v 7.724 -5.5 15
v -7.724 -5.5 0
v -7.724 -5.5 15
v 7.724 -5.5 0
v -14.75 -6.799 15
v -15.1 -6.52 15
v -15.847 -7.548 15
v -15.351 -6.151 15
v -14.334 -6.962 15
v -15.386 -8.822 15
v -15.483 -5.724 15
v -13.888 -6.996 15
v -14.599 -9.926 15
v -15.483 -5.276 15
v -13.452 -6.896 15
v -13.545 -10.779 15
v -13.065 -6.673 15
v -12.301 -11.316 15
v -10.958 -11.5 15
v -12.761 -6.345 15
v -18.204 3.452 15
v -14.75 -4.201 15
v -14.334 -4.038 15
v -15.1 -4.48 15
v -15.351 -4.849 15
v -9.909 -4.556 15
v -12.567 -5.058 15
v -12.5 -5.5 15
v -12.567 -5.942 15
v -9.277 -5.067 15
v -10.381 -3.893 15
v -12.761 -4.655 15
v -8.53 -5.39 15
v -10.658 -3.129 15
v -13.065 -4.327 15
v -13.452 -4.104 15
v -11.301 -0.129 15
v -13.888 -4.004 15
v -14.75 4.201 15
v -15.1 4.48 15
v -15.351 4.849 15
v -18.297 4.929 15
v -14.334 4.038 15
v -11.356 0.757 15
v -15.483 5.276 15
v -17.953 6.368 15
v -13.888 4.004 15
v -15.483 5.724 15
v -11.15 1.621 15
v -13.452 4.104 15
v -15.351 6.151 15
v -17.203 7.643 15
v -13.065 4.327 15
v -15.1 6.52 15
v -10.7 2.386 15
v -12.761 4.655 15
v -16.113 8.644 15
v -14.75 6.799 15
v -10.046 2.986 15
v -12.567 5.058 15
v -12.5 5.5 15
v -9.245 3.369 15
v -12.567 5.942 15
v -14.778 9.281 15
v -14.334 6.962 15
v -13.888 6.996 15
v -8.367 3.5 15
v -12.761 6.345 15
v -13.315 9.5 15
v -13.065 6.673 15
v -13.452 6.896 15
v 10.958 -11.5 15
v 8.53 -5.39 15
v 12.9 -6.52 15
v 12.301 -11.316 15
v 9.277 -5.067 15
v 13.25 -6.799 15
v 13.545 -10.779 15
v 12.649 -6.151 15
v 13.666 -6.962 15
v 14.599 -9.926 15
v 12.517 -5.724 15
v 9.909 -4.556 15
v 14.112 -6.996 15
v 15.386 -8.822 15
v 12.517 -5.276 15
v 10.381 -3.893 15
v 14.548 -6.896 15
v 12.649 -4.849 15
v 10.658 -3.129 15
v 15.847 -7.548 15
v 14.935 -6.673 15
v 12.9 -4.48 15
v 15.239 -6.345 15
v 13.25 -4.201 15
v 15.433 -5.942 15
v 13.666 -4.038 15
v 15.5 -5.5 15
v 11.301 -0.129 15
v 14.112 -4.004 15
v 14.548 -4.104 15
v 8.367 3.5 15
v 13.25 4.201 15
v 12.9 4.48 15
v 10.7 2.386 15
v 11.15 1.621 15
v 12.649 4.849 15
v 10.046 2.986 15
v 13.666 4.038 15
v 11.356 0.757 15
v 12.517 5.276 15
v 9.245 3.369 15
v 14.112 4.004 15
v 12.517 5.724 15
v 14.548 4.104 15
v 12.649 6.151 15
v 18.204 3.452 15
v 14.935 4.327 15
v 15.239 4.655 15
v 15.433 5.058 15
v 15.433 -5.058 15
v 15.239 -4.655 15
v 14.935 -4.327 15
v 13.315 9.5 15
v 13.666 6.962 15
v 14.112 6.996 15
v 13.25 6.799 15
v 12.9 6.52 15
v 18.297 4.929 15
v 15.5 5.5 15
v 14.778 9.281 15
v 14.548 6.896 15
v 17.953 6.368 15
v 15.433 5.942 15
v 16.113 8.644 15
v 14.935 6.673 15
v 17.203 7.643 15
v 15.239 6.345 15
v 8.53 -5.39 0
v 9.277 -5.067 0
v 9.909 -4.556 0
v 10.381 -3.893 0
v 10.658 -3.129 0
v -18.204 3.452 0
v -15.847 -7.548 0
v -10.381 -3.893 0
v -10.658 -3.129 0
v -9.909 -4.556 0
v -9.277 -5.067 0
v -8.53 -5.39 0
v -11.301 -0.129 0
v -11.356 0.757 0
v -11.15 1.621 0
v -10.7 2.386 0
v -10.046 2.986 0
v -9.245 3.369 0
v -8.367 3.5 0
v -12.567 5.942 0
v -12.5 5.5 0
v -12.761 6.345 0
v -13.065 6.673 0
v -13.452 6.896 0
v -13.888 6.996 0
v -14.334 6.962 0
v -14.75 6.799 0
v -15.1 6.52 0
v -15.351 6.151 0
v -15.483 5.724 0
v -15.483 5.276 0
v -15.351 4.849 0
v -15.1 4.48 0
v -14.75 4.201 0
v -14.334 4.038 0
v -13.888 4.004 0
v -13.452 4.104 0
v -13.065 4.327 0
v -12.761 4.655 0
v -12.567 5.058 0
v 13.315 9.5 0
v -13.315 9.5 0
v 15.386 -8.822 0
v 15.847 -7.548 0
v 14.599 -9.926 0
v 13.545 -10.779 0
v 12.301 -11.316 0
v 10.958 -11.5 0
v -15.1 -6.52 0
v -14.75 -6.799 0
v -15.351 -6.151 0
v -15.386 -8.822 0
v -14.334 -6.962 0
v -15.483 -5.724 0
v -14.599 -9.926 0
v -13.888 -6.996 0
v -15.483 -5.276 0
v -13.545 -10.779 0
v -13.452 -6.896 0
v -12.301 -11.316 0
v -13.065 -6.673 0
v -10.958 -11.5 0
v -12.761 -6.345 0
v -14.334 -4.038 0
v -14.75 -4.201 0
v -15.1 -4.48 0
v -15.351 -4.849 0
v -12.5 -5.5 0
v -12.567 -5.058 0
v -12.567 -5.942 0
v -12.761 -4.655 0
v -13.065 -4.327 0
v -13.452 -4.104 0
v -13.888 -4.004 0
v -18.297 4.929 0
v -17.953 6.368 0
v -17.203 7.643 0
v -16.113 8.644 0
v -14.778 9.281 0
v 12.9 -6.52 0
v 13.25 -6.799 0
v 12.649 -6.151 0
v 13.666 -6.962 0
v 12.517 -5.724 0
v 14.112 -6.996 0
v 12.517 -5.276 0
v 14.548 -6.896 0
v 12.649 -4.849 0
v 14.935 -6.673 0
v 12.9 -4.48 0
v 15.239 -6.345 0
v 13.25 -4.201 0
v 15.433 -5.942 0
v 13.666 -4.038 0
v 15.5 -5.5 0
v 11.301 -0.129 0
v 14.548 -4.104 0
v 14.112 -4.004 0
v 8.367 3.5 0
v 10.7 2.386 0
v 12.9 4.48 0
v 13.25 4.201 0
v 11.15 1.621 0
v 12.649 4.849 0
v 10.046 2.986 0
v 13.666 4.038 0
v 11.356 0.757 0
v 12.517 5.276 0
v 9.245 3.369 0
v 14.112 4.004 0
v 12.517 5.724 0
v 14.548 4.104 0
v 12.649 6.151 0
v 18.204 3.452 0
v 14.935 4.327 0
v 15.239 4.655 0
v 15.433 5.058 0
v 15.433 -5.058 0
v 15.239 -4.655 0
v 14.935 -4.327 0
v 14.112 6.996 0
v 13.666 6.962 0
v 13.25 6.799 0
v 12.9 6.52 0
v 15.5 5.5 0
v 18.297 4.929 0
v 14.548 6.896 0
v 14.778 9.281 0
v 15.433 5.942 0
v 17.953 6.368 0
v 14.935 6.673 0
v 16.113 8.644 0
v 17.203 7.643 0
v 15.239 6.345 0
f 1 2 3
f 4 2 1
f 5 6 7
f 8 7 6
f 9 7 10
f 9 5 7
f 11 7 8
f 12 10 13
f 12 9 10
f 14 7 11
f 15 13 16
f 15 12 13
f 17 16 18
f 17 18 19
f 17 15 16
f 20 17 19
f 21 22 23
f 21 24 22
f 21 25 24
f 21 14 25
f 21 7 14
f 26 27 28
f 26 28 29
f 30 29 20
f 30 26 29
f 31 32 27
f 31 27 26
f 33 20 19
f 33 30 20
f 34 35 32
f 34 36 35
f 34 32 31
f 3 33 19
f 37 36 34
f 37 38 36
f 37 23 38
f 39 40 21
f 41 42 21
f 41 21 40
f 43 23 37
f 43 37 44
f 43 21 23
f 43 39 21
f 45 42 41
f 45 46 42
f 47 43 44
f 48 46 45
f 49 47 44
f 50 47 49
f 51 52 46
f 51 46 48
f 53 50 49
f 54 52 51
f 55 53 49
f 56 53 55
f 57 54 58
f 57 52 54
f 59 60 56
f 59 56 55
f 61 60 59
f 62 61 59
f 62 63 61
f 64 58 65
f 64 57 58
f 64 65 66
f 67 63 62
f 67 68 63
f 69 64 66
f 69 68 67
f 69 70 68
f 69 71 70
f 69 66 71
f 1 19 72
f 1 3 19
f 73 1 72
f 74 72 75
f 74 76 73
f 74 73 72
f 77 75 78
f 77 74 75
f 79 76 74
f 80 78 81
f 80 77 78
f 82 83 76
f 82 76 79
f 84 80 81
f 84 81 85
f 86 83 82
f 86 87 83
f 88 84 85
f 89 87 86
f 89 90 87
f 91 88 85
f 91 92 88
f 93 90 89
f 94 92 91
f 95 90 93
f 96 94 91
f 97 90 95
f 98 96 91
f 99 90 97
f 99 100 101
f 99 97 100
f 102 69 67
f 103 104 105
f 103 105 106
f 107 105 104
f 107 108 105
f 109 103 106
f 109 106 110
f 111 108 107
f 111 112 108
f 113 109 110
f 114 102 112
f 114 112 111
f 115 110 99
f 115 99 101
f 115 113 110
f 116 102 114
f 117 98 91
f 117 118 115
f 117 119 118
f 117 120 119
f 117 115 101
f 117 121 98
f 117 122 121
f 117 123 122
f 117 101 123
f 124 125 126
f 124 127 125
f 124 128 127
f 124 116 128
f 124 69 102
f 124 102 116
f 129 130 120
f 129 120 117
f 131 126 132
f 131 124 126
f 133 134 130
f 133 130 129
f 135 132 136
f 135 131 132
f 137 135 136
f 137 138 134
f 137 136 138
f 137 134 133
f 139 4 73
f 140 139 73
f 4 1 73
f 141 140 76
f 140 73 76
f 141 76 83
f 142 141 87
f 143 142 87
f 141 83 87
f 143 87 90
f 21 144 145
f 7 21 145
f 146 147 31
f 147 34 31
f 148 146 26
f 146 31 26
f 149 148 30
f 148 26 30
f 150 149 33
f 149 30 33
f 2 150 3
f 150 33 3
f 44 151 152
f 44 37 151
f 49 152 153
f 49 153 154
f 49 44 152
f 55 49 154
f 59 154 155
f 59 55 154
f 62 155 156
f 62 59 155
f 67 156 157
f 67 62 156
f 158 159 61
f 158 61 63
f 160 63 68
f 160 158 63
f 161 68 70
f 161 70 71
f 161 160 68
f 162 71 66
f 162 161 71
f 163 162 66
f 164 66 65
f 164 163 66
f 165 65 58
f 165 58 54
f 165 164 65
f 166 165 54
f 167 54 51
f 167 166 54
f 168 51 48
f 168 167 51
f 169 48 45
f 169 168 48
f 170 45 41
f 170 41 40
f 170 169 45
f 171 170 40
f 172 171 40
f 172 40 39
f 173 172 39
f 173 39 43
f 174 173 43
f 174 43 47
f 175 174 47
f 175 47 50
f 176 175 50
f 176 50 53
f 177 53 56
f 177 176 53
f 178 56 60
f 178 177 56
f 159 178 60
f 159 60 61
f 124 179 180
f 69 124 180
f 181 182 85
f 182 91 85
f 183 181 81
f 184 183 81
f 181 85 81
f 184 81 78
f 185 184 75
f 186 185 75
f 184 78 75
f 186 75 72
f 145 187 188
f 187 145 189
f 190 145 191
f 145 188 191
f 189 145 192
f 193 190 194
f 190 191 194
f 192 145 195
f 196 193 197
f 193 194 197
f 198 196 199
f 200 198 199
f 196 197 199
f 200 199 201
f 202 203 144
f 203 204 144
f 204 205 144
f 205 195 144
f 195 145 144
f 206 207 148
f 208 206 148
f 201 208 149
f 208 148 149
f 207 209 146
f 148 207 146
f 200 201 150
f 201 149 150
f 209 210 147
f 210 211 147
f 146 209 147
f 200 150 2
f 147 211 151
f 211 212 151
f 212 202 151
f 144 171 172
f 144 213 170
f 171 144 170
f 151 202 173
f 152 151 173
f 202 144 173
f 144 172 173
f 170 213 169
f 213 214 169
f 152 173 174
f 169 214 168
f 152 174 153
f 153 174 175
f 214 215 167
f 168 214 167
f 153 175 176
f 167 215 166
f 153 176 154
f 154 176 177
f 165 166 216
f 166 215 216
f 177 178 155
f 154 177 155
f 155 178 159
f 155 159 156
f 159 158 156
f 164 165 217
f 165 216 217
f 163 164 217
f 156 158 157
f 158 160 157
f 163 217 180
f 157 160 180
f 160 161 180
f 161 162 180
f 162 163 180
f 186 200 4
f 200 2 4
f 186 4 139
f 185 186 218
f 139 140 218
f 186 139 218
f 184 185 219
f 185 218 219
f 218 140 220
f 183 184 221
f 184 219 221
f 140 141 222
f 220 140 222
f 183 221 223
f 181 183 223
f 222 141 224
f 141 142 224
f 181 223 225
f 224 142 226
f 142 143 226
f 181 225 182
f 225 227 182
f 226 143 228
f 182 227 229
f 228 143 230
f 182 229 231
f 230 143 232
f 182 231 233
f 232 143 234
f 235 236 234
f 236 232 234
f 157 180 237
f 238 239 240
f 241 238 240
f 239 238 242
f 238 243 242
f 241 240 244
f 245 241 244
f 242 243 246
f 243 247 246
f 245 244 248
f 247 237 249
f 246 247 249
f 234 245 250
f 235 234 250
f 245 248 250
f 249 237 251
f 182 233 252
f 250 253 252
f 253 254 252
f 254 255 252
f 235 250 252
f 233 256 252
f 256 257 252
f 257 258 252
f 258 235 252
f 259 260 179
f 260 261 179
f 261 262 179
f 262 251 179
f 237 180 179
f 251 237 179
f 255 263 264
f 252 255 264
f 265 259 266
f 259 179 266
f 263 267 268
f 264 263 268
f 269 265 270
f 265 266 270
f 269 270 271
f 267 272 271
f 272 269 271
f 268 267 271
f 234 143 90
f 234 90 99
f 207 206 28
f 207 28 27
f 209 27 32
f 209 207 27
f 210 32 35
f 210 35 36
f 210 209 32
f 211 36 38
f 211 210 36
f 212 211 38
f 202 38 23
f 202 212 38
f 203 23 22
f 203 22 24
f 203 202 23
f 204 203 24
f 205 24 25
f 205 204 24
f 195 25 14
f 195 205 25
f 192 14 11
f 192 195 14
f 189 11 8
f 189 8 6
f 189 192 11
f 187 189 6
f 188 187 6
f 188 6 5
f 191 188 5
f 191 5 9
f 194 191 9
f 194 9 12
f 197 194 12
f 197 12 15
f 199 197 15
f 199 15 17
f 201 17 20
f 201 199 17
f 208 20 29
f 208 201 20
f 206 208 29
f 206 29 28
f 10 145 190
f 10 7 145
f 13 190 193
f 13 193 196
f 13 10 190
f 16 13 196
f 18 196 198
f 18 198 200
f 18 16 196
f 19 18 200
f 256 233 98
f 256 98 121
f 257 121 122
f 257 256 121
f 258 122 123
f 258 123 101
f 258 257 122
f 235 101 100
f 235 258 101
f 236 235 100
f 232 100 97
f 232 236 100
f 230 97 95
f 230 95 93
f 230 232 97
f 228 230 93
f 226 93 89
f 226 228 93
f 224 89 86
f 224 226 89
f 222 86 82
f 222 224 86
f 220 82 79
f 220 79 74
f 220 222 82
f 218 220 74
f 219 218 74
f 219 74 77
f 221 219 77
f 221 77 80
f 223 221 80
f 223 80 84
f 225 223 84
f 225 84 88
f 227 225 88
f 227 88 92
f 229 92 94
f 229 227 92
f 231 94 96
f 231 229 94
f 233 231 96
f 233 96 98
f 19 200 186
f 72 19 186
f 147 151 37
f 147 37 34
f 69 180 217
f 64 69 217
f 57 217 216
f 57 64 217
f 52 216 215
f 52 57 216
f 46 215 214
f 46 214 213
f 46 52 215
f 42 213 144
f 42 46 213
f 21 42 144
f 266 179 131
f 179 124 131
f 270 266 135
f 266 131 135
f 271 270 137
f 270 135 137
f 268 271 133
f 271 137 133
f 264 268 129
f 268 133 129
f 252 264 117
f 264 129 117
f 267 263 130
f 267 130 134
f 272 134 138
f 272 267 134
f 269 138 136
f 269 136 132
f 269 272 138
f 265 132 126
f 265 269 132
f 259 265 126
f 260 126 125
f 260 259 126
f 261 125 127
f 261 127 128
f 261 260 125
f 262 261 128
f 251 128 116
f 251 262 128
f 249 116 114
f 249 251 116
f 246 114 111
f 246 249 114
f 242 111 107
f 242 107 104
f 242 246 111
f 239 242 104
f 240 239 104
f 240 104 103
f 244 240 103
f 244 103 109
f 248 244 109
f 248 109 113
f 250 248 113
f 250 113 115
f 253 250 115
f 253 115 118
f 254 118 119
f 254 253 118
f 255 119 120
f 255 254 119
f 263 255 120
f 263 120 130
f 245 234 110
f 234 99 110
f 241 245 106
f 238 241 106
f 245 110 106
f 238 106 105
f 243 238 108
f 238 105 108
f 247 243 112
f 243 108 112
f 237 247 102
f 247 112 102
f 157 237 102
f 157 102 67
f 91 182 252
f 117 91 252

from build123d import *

# Parameters (mm, degrees)
SKETCH_1_R      = 1.5
EXTRUDE_1_DEPTH = 15
FILLET_1_R      = 5
FILLET_2_R      = 3


with BuildPart() as part:
    # 草图1 → 凸台-拉伸1 (new body)
    with BuildSketch(Plane.XY):
        Polygon((19.5, 9.5), (-19.5, 9.5), (-15, -11.5), (15, -11.5), align=None)
        with Locations((14, -5.5)):
            Circle(SKETCH_1_R, mode=Mode.SUBTRACT)
        with Locations((-14, -5.5)):
            Circle(SKETCH_1_R, mode=Mode.SUBTRACT)
        with Locations((-14, 5.5)):
            Circle(SKETCH_1_R, mode=Mode.SUBTRACT)
        with Locations((14, 5.5)):
            Circle(SKETCH_1_R, mode=Mode.SUBTRACT)
        Polygon((-12.078076687, 3.5), (-10.149505259, -5.5), (10.149505259, -5.5), (12.078076687, 3.5), align=None, mode=Mode.SUBTRACT)
    extrude(amount=EXTRUDE_1_DEPTH)

    # 圆角1
    fillet_1_edges = [part.edges().sort_by_distance(p)[0] for p in [
        (15, -11.5, 7.5),
        (-15, -11.5, 7.5),
        (-19.5, 9.5, 7.5),
        (19.5, 9.5, 7.5),
    ]]
    fillet(fillet_1_edges, radius=FILLET_1_R)

    # 圆角2
    fillet_2_edges = [part.edges().sort_by_distance(p)[0] for p in [
        (12.078076687, 3.5, 7.5),
        (-12.078076687, 3.5, 7.5),
        (-10.149505259, -5.5, 7.5),
        (10.149505259, -5.5, 7.5),
    ]]
    fillet(fillet_2_edges, radius=FILLET_2_R)


solid = part.part
